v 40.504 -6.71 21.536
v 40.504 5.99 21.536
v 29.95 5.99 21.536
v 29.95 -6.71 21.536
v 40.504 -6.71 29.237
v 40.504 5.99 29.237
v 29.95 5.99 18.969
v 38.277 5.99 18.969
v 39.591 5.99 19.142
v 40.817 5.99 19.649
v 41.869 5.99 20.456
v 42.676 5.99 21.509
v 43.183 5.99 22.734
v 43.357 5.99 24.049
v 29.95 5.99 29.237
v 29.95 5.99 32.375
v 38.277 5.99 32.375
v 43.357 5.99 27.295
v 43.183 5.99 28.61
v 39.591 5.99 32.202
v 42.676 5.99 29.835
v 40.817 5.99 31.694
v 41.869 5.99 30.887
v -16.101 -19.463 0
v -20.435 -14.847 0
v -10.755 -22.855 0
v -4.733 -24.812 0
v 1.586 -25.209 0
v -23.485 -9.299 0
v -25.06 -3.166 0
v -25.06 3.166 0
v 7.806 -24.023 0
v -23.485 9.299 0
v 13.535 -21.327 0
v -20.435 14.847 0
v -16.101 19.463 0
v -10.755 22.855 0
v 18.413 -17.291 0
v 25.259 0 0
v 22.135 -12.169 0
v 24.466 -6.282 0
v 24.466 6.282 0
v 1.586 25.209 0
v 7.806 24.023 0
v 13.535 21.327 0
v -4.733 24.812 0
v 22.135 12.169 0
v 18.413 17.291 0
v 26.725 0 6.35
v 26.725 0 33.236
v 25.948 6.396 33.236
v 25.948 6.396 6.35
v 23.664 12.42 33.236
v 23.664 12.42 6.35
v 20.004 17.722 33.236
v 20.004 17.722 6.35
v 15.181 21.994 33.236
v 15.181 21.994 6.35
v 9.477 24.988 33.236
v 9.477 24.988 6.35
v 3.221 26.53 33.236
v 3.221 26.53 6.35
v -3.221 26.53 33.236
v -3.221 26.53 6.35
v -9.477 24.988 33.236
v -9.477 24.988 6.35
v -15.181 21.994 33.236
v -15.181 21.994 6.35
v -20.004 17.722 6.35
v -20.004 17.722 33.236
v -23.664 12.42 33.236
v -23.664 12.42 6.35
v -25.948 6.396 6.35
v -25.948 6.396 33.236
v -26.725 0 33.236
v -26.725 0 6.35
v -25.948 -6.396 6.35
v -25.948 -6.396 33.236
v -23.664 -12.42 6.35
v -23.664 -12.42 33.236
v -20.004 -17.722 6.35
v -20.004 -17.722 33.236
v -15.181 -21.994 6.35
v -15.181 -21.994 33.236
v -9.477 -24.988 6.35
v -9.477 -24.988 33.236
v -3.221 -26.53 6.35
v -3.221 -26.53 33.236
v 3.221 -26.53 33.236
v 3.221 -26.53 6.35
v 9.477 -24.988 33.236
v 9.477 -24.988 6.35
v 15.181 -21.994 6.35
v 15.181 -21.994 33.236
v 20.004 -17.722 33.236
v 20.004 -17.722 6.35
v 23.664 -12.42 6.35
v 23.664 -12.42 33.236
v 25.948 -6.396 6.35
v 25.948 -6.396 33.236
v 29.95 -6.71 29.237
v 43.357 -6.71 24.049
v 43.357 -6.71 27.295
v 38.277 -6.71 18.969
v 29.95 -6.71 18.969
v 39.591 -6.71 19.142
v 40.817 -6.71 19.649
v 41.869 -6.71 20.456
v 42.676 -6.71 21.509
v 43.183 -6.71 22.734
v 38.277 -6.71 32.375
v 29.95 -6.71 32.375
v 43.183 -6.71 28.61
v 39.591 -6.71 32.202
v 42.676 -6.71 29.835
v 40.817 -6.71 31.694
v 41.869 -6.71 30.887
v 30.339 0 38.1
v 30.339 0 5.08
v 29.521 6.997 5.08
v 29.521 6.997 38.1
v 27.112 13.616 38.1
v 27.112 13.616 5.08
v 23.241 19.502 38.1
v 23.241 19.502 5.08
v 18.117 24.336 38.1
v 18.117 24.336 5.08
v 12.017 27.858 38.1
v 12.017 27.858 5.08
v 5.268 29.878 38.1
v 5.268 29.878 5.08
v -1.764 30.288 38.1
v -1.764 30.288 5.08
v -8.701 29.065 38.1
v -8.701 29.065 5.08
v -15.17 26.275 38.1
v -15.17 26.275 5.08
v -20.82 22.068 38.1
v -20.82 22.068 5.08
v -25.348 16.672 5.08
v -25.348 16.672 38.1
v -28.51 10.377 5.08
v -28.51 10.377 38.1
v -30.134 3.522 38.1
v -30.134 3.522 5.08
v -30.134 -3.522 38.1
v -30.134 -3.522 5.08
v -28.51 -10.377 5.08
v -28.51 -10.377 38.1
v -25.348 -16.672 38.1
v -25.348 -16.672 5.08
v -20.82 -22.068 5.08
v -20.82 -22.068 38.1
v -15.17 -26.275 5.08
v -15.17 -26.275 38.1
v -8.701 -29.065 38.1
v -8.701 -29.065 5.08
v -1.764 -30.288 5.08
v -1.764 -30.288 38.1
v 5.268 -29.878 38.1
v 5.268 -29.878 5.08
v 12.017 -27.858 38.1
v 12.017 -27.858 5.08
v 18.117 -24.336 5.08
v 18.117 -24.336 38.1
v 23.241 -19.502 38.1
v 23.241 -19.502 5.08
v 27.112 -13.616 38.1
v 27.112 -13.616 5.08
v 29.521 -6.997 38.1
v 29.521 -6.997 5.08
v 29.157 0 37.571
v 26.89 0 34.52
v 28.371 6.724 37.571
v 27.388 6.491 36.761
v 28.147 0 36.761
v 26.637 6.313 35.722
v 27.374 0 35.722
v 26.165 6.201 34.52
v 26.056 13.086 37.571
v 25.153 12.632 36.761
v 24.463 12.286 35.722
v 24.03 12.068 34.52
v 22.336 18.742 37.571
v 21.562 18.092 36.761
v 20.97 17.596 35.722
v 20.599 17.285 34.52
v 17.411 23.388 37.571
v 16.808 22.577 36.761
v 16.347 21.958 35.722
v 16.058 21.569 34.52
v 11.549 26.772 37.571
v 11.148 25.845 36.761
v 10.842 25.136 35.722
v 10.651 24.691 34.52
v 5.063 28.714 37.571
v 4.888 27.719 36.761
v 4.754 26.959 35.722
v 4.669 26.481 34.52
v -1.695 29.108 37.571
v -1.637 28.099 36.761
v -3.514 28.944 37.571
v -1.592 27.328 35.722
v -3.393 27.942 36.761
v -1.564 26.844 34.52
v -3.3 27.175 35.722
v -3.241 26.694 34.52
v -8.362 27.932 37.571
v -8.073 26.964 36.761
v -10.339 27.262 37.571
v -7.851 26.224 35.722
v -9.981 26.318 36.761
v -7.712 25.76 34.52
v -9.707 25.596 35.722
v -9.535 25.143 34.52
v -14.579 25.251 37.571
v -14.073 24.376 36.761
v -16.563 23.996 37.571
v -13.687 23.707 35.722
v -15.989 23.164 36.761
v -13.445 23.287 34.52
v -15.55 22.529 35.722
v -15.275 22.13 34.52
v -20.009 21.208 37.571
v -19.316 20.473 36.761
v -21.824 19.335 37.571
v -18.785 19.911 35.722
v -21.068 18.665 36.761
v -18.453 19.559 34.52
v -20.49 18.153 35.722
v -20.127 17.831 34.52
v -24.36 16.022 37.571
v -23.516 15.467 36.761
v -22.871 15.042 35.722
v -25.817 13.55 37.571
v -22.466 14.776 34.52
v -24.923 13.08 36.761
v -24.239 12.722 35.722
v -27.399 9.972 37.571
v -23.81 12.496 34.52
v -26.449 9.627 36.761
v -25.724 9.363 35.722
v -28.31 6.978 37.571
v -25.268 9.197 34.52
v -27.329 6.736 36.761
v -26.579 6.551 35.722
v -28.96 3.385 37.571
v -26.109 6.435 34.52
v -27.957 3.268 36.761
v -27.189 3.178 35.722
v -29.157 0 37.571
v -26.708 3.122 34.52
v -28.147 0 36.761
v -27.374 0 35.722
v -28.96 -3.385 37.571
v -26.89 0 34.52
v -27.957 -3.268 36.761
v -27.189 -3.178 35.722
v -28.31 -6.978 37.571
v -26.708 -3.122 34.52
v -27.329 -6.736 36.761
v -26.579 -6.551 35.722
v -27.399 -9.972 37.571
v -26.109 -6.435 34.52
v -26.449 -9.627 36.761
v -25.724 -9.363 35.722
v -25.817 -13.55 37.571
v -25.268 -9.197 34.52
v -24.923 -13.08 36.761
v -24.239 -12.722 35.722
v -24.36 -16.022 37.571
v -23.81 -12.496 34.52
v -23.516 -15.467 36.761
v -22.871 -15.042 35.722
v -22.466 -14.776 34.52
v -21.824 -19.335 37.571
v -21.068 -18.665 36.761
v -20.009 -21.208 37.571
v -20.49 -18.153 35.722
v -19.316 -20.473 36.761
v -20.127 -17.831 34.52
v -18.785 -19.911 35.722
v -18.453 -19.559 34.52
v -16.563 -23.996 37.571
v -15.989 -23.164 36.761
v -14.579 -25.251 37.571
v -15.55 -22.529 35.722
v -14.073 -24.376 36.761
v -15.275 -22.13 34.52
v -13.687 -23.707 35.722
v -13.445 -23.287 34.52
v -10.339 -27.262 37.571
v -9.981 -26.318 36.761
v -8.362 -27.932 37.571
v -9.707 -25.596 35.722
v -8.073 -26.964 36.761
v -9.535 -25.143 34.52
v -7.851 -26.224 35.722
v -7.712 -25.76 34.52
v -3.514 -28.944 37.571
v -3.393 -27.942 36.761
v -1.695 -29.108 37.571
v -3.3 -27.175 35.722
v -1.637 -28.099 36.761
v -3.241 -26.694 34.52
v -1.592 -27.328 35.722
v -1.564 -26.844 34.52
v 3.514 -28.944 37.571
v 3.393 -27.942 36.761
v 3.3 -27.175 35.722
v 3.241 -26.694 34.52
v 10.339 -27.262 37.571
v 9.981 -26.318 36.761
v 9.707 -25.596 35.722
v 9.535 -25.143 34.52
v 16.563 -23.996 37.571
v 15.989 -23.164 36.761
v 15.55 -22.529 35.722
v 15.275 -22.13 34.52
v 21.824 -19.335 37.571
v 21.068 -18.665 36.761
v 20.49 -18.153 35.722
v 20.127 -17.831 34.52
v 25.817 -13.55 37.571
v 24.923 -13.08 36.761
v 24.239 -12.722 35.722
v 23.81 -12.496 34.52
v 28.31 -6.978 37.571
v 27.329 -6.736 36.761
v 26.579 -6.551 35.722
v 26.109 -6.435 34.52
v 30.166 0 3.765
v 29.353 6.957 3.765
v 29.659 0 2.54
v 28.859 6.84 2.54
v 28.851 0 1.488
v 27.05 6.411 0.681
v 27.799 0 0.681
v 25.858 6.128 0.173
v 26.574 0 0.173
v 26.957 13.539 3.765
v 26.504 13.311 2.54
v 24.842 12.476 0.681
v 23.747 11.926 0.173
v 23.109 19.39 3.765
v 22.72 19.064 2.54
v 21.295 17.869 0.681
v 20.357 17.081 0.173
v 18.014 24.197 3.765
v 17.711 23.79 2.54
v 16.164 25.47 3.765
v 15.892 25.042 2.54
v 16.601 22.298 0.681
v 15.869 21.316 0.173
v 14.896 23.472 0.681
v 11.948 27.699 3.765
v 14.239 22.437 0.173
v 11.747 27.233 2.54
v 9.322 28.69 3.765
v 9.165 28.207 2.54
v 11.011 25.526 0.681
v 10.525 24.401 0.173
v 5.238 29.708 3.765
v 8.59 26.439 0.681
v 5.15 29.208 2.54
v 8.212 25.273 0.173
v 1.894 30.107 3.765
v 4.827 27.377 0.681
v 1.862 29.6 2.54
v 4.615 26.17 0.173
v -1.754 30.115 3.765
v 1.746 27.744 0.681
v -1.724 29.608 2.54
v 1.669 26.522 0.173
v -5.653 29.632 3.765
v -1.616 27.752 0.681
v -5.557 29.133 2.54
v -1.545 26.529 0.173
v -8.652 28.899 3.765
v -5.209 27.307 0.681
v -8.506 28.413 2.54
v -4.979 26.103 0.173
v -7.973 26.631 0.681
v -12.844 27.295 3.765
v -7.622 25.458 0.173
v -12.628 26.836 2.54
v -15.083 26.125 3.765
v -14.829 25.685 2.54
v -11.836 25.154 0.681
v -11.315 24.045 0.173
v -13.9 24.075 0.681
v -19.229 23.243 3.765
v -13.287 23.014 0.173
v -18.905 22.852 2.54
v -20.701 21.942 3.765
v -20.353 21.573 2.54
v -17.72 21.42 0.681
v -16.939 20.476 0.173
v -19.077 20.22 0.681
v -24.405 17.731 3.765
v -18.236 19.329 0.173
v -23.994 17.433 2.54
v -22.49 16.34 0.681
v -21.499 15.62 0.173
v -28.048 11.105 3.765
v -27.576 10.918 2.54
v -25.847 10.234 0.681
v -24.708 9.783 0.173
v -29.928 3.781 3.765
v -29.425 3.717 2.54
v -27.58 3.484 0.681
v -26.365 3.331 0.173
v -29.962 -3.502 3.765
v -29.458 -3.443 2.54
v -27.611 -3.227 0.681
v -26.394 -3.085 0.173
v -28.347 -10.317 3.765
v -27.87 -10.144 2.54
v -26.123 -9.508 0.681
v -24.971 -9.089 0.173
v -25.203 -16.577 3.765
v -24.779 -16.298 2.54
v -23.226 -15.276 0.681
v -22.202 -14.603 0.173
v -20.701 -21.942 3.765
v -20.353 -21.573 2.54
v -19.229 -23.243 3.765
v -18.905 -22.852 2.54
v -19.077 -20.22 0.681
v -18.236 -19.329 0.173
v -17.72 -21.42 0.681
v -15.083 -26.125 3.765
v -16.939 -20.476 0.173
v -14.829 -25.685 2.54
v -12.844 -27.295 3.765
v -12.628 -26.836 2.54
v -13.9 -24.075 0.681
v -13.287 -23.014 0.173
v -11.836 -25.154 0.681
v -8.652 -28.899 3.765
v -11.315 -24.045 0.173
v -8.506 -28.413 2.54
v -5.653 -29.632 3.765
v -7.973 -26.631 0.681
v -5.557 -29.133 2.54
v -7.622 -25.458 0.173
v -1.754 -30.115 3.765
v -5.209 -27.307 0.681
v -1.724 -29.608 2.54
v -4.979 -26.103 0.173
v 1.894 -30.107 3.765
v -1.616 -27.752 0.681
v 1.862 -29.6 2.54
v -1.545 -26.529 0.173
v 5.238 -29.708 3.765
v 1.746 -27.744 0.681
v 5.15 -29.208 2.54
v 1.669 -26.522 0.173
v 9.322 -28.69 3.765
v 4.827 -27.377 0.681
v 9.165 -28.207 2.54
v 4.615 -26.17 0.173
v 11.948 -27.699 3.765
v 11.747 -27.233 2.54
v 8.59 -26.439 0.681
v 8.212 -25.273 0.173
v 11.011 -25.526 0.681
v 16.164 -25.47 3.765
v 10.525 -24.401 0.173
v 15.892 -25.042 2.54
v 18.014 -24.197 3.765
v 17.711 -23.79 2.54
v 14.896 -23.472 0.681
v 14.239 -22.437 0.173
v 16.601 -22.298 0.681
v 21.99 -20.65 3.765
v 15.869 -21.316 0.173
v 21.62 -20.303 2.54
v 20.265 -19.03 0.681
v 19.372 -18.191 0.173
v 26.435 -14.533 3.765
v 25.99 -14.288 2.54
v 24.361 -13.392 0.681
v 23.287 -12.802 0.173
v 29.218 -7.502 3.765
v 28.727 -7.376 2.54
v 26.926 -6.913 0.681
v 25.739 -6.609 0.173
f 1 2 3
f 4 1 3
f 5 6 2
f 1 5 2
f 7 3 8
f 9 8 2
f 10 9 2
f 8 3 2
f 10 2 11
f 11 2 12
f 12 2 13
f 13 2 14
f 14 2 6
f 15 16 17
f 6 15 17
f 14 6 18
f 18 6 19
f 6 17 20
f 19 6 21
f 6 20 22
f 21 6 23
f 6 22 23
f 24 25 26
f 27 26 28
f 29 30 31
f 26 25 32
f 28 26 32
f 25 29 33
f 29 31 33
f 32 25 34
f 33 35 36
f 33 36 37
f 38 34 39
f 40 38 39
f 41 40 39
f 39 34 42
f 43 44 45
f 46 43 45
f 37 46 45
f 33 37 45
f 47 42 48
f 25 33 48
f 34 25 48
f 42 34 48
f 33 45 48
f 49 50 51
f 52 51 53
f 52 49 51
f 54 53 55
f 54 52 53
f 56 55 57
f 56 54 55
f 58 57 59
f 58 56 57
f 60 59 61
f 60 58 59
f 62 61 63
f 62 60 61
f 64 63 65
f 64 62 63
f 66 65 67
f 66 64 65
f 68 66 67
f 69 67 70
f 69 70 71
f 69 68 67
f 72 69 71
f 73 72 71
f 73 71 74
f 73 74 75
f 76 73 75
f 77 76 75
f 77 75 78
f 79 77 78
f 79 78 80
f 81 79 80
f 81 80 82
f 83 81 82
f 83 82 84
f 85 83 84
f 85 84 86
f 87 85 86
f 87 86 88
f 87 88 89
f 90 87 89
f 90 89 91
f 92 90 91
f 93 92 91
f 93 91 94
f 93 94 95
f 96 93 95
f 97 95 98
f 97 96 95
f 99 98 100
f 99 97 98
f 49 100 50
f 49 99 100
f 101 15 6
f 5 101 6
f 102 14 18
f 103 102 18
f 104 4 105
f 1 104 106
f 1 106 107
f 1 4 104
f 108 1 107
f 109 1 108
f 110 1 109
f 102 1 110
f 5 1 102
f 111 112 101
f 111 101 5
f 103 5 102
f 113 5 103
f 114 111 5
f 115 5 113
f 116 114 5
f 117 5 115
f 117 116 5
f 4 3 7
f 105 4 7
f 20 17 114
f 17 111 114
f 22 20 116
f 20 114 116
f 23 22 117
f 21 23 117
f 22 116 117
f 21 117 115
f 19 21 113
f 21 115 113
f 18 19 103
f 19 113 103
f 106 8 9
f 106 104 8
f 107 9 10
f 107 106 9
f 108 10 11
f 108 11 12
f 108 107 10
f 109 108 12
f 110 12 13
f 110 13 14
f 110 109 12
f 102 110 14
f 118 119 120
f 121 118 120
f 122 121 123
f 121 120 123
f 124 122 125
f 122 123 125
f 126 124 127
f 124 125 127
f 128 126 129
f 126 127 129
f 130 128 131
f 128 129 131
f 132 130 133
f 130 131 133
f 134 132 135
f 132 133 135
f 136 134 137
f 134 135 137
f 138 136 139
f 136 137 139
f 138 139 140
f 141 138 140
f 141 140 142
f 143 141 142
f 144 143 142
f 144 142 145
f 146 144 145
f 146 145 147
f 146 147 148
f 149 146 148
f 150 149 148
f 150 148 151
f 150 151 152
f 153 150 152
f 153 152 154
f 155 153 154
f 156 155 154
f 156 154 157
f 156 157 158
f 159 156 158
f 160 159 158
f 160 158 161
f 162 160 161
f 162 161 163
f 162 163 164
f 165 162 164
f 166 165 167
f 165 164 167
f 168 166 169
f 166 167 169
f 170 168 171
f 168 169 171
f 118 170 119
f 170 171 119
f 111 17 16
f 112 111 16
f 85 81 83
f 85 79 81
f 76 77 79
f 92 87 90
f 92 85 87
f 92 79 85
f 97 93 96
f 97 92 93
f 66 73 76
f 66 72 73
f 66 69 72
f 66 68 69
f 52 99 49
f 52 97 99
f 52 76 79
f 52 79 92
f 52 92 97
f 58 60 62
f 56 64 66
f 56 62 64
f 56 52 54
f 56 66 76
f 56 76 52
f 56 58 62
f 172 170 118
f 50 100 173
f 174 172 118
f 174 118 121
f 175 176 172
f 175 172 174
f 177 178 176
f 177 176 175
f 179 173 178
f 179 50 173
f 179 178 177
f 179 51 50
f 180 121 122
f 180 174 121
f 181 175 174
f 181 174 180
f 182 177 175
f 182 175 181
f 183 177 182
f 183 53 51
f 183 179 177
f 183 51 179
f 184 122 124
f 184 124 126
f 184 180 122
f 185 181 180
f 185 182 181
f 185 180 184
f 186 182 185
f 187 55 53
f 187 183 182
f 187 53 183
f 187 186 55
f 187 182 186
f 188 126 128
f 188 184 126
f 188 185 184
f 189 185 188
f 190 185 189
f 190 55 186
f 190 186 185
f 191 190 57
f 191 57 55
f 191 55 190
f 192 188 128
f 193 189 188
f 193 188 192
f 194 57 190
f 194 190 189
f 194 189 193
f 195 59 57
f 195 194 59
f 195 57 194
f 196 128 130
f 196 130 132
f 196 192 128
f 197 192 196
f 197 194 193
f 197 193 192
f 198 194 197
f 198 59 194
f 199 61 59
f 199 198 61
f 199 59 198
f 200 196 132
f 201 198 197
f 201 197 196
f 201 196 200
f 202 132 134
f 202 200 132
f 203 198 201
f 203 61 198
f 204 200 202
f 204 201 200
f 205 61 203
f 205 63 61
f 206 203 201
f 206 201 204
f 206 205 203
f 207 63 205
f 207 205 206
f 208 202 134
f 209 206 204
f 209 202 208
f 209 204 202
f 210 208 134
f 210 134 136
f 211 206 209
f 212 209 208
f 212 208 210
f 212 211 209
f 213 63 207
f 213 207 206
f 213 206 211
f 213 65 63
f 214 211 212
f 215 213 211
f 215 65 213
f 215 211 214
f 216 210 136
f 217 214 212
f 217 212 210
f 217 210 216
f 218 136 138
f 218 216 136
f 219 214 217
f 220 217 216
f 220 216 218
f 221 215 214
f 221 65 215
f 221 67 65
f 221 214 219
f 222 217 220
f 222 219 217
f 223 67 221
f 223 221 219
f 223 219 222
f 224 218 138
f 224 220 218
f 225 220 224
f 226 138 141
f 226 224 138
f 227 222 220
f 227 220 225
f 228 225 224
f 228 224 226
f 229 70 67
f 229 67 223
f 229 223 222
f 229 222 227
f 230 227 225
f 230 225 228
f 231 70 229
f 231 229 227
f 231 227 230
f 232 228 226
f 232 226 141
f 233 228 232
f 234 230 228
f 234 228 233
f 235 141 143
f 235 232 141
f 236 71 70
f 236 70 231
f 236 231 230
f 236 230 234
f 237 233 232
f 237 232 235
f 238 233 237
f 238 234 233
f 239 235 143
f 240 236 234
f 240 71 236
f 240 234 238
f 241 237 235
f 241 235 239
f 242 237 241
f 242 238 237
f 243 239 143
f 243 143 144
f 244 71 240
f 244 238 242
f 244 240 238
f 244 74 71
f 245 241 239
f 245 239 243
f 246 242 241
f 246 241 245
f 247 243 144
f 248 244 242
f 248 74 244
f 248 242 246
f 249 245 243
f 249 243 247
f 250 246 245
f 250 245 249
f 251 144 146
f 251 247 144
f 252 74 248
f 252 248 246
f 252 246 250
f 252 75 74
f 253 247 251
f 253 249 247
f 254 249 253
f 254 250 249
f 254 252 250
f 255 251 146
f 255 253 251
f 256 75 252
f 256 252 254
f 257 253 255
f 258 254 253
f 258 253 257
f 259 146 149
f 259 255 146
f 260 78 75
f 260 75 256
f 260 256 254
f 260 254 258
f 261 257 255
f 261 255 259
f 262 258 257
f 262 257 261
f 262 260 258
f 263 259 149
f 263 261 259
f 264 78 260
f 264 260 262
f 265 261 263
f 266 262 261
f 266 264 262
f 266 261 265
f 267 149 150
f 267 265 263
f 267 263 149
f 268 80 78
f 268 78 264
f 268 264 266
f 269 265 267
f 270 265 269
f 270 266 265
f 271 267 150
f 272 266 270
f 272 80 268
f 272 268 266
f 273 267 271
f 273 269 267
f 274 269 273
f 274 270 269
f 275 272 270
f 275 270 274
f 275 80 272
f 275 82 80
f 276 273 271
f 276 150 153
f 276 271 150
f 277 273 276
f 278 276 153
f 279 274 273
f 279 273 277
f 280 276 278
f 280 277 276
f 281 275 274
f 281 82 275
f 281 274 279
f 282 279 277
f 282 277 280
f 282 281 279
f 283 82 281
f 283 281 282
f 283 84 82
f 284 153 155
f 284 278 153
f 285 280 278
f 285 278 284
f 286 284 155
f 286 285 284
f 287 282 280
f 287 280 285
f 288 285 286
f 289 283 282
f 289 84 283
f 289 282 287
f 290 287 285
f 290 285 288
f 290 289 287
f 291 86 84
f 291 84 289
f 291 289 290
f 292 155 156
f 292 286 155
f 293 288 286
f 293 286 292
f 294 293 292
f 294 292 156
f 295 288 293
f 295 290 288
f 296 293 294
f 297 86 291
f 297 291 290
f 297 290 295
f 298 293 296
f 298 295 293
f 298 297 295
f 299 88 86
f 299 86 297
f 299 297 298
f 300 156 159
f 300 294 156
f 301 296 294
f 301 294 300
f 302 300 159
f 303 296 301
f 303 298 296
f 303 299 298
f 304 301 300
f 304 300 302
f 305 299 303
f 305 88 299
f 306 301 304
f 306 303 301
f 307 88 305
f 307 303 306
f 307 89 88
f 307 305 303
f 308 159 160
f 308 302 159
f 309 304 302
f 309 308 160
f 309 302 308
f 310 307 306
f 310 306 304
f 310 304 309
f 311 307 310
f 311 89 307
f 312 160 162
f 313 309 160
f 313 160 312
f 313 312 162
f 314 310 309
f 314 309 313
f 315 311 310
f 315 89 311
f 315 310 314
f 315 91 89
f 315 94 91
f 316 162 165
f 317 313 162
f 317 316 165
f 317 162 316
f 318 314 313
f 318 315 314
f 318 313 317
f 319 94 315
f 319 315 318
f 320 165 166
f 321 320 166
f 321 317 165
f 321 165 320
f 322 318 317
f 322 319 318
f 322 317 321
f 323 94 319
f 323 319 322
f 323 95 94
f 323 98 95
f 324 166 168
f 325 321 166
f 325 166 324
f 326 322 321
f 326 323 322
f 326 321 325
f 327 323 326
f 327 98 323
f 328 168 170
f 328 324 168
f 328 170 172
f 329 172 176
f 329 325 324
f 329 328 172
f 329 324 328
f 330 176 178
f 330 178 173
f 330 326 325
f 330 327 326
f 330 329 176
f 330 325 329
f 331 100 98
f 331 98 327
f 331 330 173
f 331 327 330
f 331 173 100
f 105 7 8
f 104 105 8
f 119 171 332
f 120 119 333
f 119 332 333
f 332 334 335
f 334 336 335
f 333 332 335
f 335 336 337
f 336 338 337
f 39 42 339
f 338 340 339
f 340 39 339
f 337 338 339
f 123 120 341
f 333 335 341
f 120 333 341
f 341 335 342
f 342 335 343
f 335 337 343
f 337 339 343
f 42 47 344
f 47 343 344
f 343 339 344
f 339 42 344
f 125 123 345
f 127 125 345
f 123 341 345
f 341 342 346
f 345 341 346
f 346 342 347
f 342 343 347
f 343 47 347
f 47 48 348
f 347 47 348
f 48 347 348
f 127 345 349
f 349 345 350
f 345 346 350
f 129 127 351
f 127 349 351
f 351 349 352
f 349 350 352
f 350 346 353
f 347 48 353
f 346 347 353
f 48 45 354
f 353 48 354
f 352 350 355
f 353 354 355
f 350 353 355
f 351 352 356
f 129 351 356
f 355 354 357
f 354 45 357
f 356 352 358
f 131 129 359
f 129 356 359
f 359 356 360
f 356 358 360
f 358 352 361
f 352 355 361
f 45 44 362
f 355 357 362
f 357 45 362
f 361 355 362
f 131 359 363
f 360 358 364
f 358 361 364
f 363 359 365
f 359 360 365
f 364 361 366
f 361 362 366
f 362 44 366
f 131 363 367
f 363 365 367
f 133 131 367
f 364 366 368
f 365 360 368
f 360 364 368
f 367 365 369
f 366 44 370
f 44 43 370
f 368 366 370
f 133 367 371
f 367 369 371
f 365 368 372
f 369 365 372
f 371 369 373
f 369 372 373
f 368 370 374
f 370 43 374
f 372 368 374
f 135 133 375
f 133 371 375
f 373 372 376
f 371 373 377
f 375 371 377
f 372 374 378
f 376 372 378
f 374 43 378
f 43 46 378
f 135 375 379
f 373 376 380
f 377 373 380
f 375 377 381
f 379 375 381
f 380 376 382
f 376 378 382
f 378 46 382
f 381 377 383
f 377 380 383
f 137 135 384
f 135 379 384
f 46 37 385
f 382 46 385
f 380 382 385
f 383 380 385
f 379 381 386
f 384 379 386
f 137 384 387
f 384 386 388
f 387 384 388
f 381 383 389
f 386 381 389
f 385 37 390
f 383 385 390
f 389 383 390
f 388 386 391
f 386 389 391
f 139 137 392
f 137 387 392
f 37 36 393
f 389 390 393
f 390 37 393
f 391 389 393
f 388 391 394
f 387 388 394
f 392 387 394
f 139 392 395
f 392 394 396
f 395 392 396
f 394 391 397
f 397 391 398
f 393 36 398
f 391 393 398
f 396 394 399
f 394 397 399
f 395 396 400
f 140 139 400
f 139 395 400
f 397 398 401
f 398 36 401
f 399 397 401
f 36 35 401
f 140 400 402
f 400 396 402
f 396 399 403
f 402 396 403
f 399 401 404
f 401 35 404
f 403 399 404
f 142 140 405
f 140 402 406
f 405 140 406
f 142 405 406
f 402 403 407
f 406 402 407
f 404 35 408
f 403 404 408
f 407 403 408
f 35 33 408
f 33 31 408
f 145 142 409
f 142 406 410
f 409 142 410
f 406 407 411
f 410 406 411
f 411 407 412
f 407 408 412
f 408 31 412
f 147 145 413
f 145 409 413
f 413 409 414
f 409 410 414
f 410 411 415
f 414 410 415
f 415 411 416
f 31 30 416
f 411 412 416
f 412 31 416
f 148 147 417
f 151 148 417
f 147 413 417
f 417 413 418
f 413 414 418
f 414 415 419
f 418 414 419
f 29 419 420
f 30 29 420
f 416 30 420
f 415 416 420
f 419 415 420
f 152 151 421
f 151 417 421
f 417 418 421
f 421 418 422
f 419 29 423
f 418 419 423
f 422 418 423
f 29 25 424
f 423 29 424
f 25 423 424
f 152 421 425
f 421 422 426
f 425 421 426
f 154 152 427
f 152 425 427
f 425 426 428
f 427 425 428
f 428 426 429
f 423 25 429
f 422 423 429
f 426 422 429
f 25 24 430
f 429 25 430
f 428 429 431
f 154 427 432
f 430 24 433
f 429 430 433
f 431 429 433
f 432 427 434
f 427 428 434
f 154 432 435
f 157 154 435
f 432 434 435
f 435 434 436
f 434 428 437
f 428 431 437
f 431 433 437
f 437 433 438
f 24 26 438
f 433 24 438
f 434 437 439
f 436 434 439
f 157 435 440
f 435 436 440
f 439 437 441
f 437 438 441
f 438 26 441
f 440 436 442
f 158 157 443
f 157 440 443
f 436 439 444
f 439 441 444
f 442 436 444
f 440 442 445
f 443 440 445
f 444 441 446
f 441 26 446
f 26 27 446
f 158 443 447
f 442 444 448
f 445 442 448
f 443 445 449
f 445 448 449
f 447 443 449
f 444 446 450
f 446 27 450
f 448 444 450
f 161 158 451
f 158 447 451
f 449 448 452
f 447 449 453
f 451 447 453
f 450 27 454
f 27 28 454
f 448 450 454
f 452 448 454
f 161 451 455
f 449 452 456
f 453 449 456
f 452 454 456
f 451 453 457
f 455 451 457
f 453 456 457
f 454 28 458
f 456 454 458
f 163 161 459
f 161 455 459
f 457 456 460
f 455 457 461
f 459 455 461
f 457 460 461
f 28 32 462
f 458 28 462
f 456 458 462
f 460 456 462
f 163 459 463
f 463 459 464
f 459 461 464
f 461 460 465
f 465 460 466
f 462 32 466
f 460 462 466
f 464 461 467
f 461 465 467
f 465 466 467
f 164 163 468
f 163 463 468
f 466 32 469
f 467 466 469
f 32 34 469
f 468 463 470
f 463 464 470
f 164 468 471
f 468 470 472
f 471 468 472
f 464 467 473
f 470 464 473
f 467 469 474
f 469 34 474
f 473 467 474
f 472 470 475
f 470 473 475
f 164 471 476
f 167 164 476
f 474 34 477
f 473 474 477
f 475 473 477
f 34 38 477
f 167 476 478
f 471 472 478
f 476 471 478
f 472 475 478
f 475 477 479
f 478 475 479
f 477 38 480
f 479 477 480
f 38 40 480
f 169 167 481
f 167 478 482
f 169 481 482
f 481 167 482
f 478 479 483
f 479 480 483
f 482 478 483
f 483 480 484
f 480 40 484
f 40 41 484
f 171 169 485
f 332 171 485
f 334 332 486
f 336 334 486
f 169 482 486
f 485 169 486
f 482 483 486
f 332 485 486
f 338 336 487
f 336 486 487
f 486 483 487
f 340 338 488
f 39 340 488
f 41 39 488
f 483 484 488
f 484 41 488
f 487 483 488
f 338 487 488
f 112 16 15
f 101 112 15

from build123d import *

# Parameters (mm, degrees)
F0_R     = 30.3392677901
F0_R_2   = 26.724855518
F1_DEPTH = 38.1
F2_R     = 26.7339886214
F3_DEPTH = 6.35
F5_DEPTH = 12.7
F8_R     = 5.08


# Not quite as in the source:
# - a fillet or chamfer that OpenCascade refuses, or shapes differently, is made with other operations: its cross-section is extruded or revolved along the edge and cut away or added


with BuildPart() as f1:
    # F0 (on Top) → F1 (new body)
    with BuildSketch(Plane.XY):
        Circle(F0_R)
        Circle(F0_R_2, mode=Mode.SUBTRACT)
    extrude(amount=F1_DEPTH)

    # F2 (on Top) → F3 (join)
    with BuildSketch(Plane.XY):
        Circle(F2_R)
    extrude(amount=F3_DEPTH)

    # F7: fillet of radius 5.08 on 2 edges, made by hand

    # F7_s1 → F7_t2 (revolve, cut)
    with BuildSketch(Plane.XZ):
        with BuildLine():
            ThreePointArc((30.3392677901, 38.1), (27.7273816887, 36.2659561382), (26.724855518, 33.2360044601))
            Line((26.724855518, 33.2360044601), (26.724855518, 38.1))
            Line((26.724855518, 38.1), (30.3392677901, 38.1))
        make_face()
    revolve(axis=Axis((0, 0, 38.1), (0, 0, 1)), mode=Mode.SUBTRACT)

    # F7_s3 → F7_t4 (revolve, cut)
    with BuildSketch(Plane.XZ):
        with BuildLine():
            ThreePointArc((30.3392677901, 5.08), (28.8513702385, 1.4878975516), (25.2592677901, 0))
            Line((25.2592677901, 0), (30.3392677901, 0))
            Line((30.3392677901, 0), (30.3392677901, 5.08))
        make_face()
    revolve(axis=Axis((0, 0, 0), (0, 0, 1)), mode=Mode.SUBTRACT)


with BuildPart() as f5:
    # F4 (on Front) → F5 (new body)
    with BuildSketch(Plane.XZ):
        Polygon((47.0647066832, 32.3748141527), (33.6583964527, 32.3748141527), (33.6583964527, 29.2371641845), (44.2123003304, 29.2371641845), (44.2123003304, 21.5356685221), (33.6583964527, 21.5356685221), (33.6583964527, 18.9685039222), (47.0647066832, 18.9685039222), align=None)
    extrude(amount=F5_DEPTH)


with BuildPart() as f5_1:
    # F6: moved
    add(f5.part.moved(Location((-3.70813, 5.99006, 0))))

    # F8
    f8_edges = [f5_1.edges().sort_by_distance(p)[0] for p in [
        (43.356577, -0.35994, 32.374814),
        (43.356577, -0.35994, 18.968504),
    ]]
    fillet(f8_edges, radius=F8_R)


solid = Compound([f1.part, f5_1.part])
